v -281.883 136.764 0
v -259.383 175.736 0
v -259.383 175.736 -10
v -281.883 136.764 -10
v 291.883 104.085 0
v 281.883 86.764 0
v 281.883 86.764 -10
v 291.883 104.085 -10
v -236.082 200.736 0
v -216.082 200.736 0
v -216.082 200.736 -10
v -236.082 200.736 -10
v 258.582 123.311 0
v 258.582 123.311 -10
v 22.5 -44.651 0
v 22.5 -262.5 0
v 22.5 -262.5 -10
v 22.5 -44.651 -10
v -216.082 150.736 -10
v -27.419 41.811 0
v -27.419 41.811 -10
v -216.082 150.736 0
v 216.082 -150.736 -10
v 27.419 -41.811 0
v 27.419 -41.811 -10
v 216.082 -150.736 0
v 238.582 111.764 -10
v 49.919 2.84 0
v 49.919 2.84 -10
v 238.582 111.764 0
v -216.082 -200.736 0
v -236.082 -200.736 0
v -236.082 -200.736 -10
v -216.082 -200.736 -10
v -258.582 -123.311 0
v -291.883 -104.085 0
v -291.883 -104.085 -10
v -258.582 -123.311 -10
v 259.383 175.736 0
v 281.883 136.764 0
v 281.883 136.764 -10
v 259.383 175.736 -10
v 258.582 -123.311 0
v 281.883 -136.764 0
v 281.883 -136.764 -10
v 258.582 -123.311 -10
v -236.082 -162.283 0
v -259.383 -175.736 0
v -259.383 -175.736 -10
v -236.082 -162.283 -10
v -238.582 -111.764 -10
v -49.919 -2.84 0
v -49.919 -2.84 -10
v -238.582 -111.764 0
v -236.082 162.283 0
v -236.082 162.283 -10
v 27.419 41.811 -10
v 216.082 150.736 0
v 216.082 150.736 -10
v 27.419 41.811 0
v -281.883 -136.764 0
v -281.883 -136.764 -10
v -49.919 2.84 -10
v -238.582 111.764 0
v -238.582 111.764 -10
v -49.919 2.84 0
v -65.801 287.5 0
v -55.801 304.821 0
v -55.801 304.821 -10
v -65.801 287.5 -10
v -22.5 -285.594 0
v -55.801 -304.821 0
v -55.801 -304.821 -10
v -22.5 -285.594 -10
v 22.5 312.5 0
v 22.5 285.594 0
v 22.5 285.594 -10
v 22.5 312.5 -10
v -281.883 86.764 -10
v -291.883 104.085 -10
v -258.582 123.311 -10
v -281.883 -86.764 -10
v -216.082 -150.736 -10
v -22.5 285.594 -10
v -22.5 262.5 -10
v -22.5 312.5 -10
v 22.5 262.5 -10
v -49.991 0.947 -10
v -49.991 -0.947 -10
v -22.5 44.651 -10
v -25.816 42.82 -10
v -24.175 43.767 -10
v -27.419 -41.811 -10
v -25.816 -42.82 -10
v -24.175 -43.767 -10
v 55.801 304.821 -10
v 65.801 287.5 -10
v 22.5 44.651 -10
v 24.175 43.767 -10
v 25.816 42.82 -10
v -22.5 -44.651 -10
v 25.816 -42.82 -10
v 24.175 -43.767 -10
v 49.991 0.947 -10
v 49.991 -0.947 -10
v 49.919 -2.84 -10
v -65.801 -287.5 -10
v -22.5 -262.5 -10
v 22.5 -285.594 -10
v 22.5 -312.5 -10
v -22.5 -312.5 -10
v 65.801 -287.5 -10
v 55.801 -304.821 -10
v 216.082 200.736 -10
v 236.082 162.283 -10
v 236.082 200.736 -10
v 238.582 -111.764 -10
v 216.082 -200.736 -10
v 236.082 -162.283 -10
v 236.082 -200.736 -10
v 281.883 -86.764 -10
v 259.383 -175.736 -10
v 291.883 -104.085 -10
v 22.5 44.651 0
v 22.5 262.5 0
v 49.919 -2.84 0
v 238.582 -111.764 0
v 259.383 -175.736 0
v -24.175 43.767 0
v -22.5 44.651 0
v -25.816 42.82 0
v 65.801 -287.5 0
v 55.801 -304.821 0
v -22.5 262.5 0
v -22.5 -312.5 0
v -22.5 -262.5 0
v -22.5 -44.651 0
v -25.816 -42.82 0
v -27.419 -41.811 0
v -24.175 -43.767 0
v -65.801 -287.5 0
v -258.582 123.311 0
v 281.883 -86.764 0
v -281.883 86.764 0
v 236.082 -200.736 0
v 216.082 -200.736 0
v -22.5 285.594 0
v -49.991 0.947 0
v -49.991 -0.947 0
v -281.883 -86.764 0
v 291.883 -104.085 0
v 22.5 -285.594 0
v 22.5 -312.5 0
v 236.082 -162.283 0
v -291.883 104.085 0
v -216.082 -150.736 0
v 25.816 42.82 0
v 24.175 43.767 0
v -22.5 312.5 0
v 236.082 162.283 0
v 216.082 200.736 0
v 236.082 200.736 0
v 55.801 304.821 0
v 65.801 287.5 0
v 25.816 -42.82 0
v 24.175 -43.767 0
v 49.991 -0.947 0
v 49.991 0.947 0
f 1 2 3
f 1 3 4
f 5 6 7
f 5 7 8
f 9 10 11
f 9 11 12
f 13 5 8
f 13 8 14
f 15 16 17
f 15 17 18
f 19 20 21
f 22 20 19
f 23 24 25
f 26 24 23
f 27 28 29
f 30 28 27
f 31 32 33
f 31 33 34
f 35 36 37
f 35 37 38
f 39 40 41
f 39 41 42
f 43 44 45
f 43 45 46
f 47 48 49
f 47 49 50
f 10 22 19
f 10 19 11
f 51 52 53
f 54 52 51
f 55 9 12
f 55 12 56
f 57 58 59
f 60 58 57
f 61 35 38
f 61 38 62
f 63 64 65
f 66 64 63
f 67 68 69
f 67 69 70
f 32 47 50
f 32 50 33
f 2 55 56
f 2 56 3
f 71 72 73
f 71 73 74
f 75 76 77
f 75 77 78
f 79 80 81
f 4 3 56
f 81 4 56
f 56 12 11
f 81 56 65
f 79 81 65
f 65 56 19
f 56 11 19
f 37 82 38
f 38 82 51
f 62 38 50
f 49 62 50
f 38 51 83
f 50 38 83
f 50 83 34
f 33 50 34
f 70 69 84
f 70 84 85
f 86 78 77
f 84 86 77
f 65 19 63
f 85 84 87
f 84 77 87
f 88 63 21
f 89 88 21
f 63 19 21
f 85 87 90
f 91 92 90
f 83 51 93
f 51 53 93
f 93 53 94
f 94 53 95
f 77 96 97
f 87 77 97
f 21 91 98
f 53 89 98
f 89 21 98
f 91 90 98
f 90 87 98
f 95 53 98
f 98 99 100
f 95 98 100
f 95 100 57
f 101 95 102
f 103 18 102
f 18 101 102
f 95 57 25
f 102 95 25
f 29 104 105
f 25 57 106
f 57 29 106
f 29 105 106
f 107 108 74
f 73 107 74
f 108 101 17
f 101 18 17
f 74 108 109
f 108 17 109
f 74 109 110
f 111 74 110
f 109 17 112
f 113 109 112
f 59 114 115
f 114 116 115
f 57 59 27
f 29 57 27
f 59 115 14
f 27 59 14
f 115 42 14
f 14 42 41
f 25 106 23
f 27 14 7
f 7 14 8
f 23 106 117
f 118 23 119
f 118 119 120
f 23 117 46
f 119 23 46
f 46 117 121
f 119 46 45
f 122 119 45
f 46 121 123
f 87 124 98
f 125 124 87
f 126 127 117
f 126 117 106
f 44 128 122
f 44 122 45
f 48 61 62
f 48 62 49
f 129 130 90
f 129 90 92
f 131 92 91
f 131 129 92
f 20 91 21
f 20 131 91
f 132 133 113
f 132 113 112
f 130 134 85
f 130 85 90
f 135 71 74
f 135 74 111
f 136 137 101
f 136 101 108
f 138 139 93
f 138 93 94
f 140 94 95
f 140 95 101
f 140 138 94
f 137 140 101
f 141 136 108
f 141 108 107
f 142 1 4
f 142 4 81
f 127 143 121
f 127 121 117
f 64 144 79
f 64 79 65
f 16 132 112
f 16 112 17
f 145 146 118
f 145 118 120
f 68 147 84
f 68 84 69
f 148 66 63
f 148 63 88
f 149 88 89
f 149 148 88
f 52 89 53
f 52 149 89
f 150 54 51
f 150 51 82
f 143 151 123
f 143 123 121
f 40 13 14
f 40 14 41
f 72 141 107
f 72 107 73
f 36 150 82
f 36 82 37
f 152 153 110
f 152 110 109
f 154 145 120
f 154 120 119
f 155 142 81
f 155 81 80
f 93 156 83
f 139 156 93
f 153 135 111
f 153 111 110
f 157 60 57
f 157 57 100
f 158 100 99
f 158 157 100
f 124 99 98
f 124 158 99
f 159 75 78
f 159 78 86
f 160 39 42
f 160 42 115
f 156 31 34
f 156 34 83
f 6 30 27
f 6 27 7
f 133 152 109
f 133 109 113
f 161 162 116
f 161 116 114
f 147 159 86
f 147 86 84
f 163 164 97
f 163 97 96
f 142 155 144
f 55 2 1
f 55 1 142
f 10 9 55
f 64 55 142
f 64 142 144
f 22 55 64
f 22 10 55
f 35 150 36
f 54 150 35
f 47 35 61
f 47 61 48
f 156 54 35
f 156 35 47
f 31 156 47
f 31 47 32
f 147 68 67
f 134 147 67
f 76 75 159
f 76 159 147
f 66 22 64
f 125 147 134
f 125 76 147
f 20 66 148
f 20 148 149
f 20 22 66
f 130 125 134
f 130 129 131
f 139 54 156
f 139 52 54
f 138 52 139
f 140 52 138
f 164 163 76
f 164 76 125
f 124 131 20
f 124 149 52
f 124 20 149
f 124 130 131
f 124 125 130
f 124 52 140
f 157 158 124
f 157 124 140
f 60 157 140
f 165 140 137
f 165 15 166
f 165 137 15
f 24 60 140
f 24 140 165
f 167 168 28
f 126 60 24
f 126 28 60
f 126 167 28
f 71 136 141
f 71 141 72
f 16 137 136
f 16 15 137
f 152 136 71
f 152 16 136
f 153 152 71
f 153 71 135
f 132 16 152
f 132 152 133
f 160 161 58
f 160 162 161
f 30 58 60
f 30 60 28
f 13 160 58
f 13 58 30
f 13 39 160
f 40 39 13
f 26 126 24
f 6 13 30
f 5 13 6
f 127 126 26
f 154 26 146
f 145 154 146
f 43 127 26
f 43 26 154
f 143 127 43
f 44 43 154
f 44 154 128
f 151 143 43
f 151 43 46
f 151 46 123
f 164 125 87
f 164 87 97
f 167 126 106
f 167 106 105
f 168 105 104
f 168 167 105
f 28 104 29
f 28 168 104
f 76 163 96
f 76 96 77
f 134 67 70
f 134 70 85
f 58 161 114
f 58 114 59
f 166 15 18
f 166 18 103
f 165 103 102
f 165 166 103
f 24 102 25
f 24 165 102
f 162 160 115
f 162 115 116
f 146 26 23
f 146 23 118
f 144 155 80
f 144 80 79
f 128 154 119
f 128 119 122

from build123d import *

# Parameters (mm, degrees)
SKETCH2_R           = 50
BOSS_EXTRUDE1_DEPTH = 10
BOSS_EXTRUDE2_DEPTH = 10
CIRPATTERN1_COUNT   = 6


with BuildPart() as part:
    # Sketch2 → Boss-Extrude1 (new body)
    with BuildSketch(Plane.XY):
        Circle(SKETCH2_R)
    extrude(amount=-BOSS_EXTRUDE1_DEPTH)

    # Sketch3 → Boss-Extrude2 (add)
    with BuildSketch(Plane.XY):
        Polygon((-22.5, 262.5), (-22.5, 0), (0, 0), (22.5, 0), (22.5, 262.5), (65.801270189, 287.5), (55.801270189, 304.820508076), (22.5, 285.594010768), (22.5, 312.5), (-22.5, 312.5), (-22.5, 285.594010768), (-55.801270189, 304.820508076), (-65.801270189, 287.5), align=None)
    boss_extrude2 = extrude(amount=-BOSS_EXTRUDE2_DEPTH)

    # CirPattern1: Boss-Extrude2 ×6 about axis
    cirpattern1_axis = Axis((0, 0, 0), (0, 0, 1))
    for i in range(1, CIRPATTERN1_COUNT):
        add(boss_extrude2.rotate(cirpattern1_axis, i * 360 / CIRPATTERN1_COUNT))


solid = part.part
